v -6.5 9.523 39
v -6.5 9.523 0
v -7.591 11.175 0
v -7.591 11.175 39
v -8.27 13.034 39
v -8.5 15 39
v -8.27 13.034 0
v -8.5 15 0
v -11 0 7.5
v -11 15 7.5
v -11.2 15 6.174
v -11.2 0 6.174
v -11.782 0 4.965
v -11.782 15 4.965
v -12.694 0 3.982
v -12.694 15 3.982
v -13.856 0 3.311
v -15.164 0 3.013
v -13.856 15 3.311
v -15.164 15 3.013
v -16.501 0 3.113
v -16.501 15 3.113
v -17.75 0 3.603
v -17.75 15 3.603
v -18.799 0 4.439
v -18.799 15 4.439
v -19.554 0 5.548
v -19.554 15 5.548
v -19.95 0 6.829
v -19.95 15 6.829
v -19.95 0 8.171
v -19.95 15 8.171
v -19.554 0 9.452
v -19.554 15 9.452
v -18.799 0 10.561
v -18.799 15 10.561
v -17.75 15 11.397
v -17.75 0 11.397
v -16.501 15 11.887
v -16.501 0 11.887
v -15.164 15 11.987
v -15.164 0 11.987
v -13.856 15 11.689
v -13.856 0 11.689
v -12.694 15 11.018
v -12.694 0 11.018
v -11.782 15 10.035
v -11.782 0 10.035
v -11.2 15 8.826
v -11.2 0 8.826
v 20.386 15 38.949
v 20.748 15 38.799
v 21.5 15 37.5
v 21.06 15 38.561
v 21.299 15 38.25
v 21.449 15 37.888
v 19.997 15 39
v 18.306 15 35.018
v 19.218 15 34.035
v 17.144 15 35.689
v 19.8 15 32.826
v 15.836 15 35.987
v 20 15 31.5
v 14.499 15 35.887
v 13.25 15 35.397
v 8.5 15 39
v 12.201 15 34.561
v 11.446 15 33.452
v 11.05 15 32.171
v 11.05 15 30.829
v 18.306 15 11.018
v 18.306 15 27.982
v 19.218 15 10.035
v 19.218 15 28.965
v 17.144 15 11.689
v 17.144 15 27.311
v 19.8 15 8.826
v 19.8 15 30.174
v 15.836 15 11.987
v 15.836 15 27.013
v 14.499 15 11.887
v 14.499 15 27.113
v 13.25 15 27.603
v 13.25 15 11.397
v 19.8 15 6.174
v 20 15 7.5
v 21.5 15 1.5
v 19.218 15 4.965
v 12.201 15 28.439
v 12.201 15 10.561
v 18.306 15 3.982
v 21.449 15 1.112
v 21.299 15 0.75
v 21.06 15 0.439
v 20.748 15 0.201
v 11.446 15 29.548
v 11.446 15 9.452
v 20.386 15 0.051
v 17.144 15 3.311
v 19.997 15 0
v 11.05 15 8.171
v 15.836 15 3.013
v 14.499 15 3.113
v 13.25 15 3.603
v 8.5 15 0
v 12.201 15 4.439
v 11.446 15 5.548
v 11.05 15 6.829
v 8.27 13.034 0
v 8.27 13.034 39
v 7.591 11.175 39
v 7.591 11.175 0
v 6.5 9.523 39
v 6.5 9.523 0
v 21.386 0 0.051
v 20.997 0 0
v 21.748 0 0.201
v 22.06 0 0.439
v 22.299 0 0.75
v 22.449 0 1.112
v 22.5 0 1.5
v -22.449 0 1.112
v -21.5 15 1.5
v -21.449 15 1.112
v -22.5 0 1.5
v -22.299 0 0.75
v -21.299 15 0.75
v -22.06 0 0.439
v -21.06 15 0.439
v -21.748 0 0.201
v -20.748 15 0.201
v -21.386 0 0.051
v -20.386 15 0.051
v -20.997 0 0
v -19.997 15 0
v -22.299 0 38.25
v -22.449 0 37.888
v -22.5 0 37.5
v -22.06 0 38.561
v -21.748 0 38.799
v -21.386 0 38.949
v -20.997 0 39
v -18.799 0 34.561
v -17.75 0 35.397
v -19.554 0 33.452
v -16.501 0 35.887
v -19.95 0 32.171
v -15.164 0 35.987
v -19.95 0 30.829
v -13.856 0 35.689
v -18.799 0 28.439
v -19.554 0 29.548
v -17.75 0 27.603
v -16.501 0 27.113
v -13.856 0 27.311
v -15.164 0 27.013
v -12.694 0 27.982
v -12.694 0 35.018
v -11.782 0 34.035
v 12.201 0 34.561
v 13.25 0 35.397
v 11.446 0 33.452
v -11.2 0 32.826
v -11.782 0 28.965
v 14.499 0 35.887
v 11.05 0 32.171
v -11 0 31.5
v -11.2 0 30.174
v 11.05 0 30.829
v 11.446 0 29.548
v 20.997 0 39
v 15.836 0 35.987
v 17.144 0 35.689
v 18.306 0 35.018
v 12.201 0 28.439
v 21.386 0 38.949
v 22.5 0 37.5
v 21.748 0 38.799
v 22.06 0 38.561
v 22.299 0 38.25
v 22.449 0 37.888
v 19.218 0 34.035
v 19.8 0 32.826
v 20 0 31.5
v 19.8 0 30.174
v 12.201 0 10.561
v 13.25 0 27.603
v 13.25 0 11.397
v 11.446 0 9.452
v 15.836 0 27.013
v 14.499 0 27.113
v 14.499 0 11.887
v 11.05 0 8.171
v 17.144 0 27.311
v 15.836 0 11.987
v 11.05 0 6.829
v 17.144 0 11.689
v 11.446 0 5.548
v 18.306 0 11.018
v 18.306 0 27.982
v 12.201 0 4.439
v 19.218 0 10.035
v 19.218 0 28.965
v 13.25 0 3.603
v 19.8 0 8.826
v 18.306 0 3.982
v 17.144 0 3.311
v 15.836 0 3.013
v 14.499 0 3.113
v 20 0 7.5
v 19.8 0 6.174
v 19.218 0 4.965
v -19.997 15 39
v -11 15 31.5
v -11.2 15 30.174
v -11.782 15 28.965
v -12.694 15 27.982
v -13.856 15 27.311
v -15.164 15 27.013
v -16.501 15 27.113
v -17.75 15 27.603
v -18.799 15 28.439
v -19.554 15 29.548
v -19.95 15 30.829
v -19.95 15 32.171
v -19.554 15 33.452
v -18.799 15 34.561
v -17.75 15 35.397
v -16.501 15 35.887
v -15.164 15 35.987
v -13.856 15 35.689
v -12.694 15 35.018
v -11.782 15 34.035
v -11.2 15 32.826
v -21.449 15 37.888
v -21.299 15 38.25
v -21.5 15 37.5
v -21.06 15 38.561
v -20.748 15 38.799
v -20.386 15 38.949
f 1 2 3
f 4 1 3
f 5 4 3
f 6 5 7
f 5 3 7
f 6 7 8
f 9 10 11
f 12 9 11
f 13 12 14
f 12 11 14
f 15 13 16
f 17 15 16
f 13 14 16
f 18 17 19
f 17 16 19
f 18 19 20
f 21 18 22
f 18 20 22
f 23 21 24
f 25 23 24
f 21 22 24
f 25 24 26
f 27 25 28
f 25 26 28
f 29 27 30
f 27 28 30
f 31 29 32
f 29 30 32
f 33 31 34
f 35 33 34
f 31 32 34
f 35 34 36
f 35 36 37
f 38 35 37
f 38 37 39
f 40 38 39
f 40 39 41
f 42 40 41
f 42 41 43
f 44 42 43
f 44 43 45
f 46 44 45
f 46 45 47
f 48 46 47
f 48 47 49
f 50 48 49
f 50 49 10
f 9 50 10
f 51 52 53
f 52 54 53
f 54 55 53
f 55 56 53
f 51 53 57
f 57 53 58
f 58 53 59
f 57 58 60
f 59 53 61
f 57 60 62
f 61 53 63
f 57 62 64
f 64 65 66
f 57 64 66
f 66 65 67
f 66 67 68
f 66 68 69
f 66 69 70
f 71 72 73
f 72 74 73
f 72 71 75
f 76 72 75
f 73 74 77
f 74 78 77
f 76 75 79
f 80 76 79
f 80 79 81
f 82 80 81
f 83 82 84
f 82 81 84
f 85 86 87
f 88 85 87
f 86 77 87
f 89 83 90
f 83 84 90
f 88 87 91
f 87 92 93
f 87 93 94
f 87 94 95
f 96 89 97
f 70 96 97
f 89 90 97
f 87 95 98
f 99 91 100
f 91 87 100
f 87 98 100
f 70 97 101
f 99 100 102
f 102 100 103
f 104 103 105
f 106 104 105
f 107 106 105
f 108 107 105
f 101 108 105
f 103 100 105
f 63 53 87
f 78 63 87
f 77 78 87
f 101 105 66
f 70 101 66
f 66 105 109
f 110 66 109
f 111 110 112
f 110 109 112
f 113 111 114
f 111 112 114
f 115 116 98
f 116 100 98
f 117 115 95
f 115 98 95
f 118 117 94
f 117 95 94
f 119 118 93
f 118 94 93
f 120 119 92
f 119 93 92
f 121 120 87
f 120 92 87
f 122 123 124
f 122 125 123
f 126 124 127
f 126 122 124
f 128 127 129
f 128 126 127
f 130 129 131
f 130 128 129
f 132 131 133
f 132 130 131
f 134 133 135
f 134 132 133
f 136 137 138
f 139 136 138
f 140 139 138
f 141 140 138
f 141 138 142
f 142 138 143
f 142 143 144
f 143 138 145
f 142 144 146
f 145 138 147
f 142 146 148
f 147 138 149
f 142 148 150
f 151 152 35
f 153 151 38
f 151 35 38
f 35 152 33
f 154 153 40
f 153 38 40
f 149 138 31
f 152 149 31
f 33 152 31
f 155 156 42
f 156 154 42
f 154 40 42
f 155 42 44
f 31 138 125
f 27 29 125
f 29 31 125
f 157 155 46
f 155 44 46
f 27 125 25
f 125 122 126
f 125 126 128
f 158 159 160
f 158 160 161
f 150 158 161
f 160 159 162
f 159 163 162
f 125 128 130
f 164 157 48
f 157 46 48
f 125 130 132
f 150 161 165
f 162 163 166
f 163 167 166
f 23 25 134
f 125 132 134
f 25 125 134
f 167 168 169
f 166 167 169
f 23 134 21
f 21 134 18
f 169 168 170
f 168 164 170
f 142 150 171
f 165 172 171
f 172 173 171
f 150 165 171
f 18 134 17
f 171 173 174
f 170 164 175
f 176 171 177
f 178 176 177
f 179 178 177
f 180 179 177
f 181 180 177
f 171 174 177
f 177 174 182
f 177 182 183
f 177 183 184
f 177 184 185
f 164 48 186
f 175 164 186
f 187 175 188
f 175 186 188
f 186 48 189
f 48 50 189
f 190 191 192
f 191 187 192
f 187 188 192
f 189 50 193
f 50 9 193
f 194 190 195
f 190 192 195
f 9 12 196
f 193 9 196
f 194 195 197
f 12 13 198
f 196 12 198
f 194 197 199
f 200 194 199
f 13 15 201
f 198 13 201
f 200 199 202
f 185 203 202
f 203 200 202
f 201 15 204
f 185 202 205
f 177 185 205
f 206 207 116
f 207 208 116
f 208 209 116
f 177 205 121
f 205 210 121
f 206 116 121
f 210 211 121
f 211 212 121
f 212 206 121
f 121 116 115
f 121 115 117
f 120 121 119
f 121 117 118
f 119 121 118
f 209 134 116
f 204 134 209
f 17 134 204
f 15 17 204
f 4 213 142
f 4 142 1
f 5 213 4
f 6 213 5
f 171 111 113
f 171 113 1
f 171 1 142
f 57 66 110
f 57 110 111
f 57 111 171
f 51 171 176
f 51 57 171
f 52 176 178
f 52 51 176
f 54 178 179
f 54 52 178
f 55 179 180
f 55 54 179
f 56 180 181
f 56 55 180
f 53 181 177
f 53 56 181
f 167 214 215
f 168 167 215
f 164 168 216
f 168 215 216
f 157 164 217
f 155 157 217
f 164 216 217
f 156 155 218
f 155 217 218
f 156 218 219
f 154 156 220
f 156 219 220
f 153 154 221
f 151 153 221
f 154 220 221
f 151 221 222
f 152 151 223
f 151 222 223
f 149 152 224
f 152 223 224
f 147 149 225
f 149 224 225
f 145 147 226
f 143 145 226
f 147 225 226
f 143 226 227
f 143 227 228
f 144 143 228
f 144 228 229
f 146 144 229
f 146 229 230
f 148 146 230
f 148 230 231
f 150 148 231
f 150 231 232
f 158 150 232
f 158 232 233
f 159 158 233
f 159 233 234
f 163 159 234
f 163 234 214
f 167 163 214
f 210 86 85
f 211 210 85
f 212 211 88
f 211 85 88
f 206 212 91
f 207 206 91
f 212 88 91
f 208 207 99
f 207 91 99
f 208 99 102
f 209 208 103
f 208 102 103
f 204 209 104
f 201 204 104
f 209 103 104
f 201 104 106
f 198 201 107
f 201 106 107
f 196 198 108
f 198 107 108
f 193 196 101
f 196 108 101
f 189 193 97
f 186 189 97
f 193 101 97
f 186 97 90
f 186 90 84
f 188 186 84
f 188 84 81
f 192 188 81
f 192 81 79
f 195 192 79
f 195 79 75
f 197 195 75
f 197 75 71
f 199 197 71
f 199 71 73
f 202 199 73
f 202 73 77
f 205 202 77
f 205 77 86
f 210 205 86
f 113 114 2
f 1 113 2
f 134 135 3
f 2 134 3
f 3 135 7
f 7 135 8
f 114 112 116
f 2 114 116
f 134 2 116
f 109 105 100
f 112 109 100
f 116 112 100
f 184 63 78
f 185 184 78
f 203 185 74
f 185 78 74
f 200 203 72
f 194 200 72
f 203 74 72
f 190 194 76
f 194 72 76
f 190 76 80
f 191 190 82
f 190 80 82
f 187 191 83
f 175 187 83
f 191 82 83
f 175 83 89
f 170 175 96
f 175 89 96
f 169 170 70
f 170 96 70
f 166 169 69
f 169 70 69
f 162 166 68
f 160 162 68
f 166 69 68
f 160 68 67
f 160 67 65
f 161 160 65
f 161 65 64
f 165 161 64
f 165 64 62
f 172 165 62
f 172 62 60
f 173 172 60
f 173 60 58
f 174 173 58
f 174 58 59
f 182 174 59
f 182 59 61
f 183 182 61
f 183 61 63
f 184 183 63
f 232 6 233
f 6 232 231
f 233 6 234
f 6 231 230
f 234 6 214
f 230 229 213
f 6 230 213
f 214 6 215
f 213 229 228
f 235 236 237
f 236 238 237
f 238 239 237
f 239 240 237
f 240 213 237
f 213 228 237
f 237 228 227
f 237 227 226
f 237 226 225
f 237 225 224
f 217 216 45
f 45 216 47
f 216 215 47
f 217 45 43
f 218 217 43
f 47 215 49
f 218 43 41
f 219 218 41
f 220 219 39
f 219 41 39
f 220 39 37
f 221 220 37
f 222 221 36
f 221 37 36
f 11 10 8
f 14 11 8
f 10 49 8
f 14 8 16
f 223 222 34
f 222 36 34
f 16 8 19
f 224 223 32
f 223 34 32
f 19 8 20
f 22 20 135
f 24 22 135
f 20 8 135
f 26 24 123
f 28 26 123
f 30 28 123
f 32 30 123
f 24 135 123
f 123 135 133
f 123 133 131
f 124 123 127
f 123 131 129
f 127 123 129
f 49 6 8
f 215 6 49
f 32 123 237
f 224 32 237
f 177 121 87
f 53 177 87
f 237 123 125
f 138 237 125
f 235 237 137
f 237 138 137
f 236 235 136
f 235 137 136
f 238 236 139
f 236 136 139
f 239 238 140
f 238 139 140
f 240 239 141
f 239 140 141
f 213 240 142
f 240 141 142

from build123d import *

# Parameters (mm, degrees)
ESTRUSIONE_ESTRUSIONE1_DEPTH = 39
FORO_PER_VITE_M8_1_D         = 9
FORO_PER_VITE_M8_1_DEPTH     = 30
FORO_PER_VITE_M8_1_TIP       = 2.703872786
RACCORDO1_R                  = 1.5


with BuildPart() as part:
    # Schizzo1 → Estrusione-Estrusione1 (new body)
    with BuildSketch(Plane.XY):
        with BuildLine():
            Line((-21.5, 15), (-22.5, 0))
            Line((-22.5, 0), (22.5, 0))
            Line((22.5, 0), (21.5, 15))
            Line((21.5, 15), (8.5, 15))
            ThreePointArc((8.5, 15), (7.984359711, 12.084524053), (6.5, 9.522774425))
            Line((6.5, 9.522774425), (-6.5, 9.522774425))
            ThreePointArc((-6.5, 9.522774425), (-7.984359711, 12.084524053), (-8.5, 15))
            Line((-8.5, 15), (-21.5, 15))
        make_face()
    extrude(amount=ESTRUSIONE_ESTRUSIONE1_DEPTH)

    # Foro per Vite M8-1
    with Locations(Plane(origin=(0, 0, 0), x_dir=(-1, 0, 0), z_dir=(0, -1, 0))):
        with Locations((-15.5, -31.5), (15.5, -31.5), (15.5, -7.5), (-15.5, -7.5)):
            Hole(FORO_PER_VITE_M8_1_D / 2, depth=FORO_PER_VITE_M8_1_DEPTH)
            with Locations((0, 0, -(FORO_PER_VITE_M8_1_DEPTH + FORO_PER_VITE_M8_1_TIP / 2))):  # 118° drill point
                Cone(0, FORO_PER_VITE_M8_1_D / 2, FORO_PER_VITE_M8_1_TIP, mode=Mode.SUBTRACT)

    # Raccordo1
    raccordo1_edges = [part.edges().sort_by_distance(p)[0] for p in [
        (22, 7.5, 0),
        (-22, 7.5, 0),
        (22, 7.5, 39),
        (-22, 7.5, 39),
    ]]
    fillet(raccordo1_edges, radius=RACCORDO1_R)


solid = part.part
